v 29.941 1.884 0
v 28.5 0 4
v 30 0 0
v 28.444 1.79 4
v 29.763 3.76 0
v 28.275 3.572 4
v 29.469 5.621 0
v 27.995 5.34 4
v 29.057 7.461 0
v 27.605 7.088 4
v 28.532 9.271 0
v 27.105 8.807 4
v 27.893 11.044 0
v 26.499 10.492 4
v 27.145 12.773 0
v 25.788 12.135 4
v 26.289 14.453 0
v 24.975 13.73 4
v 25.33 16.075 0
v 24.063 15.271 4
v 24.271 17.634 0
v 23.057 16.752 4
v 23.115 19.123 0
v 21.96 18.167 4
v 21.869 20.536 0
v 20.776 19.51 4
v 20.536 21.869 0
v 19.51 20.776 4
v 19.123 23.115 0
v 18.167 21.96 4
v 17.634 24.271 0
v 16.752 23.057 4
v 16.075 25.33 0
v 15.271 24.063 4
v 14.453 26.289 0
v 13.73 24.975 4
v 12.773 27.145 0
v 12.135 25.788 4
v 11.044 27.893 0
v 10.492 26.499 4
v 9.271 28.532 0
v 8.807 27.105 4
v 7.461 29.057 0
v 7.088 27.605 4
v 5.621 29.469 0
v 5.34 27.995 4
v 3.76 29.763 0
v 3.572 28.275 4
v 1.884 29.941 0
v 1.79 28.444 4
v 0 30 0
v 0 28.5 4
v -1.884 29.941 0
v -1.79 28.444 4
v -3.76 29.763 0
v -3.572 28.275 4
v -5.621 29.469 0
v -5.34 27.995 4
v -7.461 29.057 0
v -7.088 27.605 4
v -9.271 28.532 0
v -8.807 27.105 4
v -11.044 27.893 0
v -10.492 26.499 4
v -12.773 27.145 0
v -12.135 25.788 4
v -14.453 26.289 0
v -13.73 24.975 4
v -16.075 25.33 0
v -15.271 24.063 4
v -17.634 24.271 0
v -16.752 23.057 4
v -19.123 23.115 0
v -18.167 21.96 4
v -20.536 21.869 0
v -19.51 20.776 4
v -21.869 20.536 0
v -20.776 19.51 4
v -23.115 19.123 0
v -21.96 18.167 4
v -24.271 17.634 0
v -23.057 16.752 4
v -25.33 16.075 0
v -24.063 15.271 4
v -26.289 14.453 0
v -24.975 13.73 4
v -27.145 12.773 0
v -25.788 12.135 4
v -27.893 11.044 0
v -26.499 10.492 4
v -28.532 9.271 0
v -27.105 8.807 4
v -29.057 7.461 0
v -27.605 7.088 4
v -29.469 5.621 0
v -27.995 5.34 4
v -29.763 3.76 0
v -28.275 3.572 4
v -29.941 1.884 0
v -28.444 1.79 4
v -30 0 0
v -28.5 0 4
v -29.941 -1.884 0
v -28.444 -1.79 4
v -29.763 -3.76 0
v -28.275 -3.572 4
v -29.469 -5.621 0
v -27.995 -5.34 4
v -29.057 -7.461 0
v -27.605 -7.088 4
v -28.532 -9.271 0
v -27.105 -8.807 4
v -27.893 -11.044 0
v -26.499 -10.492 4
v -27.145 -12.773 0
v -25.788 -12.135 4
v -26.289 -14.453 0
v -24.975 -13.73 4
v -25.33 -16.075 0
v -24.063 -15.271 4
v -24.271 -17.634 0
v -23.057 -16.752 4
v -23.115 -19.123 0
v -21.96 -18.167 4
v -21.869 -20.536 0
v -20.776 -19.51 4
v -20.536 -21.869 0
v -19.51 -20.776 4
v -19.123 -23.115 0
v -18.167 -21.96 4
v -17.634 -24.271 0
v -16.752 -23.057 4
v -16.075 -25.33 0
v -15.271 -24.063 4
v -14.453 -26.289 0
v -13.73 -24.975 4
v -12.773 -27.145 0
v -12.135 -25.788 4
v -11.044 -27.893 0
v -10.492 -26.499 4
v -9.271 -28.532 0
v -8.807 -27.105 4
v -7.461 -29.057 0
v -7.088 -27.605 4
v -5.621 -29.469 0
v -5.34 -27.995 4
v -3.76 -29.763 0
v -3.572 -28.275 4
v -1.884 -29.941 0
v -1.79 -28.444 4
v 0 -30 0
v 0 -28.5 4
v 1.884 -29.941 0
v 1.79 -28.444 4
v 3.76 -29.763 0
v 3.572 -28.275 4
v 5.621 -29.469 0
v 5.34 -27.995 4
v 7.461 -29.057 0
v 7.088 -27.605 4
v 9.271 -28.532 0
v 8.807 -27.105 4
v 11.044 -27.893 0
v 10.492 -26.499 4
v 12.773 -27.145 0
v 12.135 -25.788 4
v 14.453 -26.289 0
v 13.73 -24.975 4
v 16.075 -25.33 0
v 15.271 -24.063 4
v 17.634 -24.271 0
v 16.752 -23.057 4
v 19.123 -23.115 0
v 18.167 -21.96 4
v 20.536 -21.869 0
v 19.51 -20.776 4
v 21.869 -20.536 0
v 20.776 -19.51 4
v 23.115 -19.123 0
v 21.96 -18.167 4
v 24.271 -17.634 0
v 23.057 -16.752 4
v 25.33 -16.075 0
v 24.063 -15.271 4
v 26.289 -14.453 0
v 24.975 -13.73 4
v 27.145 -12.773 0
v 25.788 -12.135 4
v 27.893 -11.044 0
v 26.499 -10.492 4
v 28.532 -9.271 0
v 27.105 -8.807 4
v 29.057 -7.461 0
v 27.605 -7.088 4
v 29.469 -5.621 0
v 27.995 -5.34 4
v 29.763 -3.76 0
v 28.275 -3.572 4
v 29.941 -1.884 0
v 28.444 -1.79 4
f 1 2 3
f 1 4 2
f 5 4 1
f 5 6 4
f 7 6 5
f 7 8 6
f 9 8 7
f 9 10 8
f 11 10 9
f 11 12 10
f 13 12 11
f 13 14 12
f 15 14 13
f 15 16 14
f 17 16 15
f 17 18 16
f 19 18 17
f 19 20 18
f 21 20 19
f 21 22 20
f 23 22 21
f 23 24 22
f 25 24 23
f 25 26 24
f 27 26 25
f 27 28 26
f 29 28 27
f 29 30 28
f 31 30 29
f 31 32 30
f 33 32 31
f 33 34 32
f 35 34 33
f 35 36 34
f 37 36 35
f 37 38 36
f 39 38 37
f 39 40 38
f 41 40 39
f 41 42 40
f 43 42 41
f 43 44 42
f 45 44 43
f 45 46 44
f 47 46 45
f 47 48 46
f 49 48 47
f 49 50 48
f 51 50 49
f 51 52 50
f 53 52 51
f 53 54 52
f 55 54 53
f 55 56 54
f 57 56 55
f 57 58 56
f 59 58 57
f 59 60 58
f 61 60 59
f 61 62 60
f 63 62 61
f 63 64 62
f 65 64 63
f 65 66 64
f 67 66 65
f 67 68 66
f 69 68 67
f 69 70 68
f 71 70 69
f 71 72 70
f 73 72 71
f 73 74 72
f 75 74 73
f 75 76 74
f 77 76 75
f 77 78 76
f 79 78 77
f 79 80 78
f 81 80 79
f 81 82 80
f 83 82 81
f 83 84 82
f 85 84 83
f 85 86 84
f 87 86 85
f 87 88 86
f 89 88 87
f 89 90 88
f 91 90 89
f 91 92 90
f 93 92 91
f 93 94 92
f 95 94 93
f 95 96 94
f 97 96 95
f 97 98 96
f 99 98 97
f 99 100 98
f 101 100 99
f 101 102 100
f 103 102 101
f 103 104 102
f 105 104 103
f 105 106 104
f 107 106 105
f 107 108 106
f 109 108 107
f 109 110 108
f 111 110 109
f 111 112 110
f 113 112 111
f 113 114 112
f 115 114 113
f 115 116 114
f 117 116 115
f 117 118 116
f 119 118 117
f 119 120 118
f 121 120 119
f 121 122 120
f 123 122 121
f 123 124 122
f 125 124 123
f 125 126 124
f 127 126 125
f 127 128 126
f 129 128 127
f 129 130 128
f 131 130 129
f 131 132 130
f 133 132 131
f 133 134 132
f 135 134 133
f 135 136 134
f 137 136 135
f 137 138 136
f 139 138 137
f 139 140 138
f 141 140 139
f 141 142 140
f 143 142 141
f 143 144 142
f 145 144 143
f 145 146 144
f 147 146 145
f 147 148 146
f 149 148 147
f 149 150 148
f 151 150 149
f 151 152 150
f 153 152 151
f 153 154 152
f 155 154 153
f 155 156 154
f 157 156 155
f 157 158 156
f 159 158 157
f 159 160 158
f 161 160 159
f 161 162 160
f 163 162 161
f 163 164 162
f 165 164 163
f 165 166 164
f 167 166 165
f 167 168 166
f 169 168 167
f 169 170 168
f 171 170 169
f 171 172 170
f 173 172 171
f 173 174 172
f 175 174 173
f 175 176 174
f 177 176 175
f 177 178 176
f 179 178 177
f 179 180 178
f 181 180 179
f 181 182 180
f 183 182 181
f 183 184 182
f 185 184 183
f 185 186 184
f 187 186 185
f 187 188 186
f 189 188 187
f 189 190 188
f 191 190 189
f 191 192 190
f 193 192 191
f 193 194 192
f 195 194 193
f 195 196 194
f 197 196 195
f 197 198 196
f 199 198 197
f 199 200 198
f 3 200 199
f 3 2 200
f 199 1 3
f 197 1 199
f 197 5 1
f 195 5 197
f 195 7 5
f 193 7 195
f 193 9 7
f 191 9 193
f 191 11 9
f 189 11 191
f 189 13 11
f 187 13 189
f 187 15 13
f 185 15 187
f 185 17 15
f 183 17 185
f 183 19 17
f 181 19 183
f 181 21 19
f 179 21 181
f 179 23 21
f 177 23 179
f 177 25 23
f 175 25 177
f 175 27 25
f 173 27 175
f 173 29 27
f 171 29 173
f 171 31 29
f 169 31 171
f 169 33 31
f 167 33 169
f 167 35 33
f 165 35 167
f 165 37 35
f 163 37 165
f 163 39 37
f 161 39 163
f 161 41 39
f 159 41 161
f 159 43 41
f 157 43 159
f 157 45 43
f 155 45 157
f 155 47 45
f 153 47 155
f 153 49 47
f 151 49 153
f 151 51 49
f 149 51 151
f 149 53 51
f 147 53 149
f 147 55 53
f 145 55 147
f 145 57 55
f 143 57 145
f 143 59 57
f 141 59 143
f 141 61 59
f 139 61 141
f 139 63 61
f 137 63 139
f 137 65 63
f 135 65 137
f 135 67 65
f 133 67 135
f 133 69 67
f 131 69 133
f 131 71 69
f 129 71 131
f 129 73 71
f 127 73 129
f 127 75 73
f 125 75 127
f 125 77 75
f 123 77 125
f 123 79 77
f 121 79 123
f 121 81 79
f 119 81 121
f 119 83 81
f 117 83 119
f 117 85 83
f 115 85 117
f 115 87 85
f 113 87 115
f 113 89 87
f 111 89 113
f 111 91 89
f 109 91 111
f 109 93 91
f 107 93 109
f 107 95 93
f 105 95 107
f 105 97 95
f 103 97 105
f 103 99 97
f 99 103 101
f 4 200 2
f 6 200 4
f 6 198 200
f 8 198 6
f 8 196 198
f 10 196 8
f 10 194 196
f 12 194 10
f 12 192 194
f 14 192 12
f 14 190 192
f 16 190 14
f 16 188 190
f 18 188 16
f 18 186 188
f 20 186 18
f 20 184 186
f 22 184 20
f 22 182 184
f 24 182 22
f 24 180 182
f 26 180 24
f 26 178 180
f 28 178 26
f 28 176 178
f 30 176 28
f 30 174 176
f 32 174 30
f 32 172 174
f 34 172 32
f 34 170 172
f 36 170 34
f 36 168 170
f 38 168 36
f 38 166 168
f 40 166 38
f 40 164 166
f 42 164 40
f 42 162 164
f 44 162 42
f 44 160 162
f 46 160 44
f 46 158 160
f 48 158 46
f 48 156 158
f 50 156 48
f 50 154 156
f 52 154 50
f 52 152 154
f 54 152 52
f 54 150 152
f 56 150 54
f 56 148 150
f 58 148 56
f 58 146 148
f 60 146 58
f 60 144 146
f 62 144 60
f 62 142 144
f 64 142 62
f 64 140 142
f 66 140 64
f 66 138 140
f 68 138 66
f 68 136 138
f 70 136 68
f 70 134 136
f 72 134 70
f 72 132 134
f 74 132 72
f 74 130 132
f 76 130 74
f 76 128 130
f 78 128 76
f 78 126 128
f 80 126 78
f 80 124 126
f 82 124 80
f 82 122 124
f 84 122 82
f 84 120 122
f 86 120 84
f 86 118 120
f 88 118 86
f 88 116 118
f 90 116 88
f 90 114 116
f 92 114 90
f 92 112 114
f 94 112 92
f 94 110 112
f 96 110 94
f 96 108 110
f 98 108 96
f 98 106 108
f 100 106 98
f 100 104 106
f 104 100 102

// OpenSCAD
// file: ../build.scad
$build_id = "";

function building(filename) = is_undef(filename) ?
  !is_undef(build)
  : !is_undef(build) && build == filename;

function previewing() = !building();

module build(filename) {
  $build_id = filename;

  if(!is_undef(scad_build_scan) && scad_build_scan == true) {
    echo(str("scad_build_scan: ", filename));
  }
  else if(previewing() || build == filename) {
    children();
  }
}

module preview_row(spacing) {
  if(previewing()) {
    for(x = [0:1:$children - 1]) {
      translate([x * spacing, 0, 0]) {
        children(x);
      }
    }
  }
  else {
    children();
  }
}

module preview_column(spacing) {
  if(previewing()) {
    for(y = [0:1:$children - 1]) {
      translate([0, y * spacing, 0]) {
        children(y);
      }
    }
  }
  else {
    children();
  }
}
// file: ../minibase.scad
// Based off of titancraft's Customizable Miniature Base (CC0 1.0)
// https://www.thingiverse.com/thing:1112237

include <./build.scad>

$base_rim = 1; //	[1: tapered, 2: inclined, 3: flat]
// Number of sides:
$base_shape = 100; //	[30:Low-res Circle, 100: Hi-res Circle, 5:Pentagon, 6:Hexagon, 8:Octagon, 4:Square, 3:Triangle]

$base_diameter = 32;
$base_height = 4;
$base_slant = 95;

// Percentage:
$base_stretch = 100;

//(tapered base only)
$base_inner_circle_ratio = 40;

module tapered(r=40) {
  $base_rim = 1;
  $base_inner_circle_ratio = r;

  children();
}

module inclined() {
  $base_rim = 2;

  children();
}

module flat() {
  $base_rim = 3;

  children();
}

module shape(s) {
  $base_shape = s;

  children();
}

module diameter(d) {
  $base_diameter = d;

  children();
}

module height(h) {
  $base_height = h;

  children();
}

module slant(s) {
  $base_slant = s;

  children();
}

module stretch(s) {
  $base_stretch = s;

  children();
}

module base(id) {
  build(id) union() {
    radius = $base_diameter/2;
    scale([$base_stretch/100, 1, 1]){
      if ($base_rim == 1){
        // tapered base
        cyl1_height = $base_height * (1-$base_inner_circle_ratio/100);
        cylinder(cyl1_height, radius, radius * $base_slant/100, $fn=$base_shape);

        cyl2_radius = radius  * $base_slant/100 * .95;
        cyl2_height = $base_height - cyl1_height;

        translate([0, 0, cyl1_height]){
          cylinder(cyl2_height, cyl2_radius, cyl2_radius * $base_slant/100, $fn=$base_shape);
          cylinder(cyl2_height*.5, radius * $base_slant/100, cyl2_radius, $fn=$base_shape);
        }
      } else if ($base_rim == 2){
        // inclined base
        cylinder($base_height, radius, radius * $base_slant/100, $fn=$base_shape);
      } else if ($base_rim == 3){
        // flat base

        cylinder($base_height, radius, radius, $fn=$base_shape);
      }
    }
  }
}
// main file
include <../minibase.scad>

inclined() diameter(60) base("60mm-opr-monsters-walkers");
